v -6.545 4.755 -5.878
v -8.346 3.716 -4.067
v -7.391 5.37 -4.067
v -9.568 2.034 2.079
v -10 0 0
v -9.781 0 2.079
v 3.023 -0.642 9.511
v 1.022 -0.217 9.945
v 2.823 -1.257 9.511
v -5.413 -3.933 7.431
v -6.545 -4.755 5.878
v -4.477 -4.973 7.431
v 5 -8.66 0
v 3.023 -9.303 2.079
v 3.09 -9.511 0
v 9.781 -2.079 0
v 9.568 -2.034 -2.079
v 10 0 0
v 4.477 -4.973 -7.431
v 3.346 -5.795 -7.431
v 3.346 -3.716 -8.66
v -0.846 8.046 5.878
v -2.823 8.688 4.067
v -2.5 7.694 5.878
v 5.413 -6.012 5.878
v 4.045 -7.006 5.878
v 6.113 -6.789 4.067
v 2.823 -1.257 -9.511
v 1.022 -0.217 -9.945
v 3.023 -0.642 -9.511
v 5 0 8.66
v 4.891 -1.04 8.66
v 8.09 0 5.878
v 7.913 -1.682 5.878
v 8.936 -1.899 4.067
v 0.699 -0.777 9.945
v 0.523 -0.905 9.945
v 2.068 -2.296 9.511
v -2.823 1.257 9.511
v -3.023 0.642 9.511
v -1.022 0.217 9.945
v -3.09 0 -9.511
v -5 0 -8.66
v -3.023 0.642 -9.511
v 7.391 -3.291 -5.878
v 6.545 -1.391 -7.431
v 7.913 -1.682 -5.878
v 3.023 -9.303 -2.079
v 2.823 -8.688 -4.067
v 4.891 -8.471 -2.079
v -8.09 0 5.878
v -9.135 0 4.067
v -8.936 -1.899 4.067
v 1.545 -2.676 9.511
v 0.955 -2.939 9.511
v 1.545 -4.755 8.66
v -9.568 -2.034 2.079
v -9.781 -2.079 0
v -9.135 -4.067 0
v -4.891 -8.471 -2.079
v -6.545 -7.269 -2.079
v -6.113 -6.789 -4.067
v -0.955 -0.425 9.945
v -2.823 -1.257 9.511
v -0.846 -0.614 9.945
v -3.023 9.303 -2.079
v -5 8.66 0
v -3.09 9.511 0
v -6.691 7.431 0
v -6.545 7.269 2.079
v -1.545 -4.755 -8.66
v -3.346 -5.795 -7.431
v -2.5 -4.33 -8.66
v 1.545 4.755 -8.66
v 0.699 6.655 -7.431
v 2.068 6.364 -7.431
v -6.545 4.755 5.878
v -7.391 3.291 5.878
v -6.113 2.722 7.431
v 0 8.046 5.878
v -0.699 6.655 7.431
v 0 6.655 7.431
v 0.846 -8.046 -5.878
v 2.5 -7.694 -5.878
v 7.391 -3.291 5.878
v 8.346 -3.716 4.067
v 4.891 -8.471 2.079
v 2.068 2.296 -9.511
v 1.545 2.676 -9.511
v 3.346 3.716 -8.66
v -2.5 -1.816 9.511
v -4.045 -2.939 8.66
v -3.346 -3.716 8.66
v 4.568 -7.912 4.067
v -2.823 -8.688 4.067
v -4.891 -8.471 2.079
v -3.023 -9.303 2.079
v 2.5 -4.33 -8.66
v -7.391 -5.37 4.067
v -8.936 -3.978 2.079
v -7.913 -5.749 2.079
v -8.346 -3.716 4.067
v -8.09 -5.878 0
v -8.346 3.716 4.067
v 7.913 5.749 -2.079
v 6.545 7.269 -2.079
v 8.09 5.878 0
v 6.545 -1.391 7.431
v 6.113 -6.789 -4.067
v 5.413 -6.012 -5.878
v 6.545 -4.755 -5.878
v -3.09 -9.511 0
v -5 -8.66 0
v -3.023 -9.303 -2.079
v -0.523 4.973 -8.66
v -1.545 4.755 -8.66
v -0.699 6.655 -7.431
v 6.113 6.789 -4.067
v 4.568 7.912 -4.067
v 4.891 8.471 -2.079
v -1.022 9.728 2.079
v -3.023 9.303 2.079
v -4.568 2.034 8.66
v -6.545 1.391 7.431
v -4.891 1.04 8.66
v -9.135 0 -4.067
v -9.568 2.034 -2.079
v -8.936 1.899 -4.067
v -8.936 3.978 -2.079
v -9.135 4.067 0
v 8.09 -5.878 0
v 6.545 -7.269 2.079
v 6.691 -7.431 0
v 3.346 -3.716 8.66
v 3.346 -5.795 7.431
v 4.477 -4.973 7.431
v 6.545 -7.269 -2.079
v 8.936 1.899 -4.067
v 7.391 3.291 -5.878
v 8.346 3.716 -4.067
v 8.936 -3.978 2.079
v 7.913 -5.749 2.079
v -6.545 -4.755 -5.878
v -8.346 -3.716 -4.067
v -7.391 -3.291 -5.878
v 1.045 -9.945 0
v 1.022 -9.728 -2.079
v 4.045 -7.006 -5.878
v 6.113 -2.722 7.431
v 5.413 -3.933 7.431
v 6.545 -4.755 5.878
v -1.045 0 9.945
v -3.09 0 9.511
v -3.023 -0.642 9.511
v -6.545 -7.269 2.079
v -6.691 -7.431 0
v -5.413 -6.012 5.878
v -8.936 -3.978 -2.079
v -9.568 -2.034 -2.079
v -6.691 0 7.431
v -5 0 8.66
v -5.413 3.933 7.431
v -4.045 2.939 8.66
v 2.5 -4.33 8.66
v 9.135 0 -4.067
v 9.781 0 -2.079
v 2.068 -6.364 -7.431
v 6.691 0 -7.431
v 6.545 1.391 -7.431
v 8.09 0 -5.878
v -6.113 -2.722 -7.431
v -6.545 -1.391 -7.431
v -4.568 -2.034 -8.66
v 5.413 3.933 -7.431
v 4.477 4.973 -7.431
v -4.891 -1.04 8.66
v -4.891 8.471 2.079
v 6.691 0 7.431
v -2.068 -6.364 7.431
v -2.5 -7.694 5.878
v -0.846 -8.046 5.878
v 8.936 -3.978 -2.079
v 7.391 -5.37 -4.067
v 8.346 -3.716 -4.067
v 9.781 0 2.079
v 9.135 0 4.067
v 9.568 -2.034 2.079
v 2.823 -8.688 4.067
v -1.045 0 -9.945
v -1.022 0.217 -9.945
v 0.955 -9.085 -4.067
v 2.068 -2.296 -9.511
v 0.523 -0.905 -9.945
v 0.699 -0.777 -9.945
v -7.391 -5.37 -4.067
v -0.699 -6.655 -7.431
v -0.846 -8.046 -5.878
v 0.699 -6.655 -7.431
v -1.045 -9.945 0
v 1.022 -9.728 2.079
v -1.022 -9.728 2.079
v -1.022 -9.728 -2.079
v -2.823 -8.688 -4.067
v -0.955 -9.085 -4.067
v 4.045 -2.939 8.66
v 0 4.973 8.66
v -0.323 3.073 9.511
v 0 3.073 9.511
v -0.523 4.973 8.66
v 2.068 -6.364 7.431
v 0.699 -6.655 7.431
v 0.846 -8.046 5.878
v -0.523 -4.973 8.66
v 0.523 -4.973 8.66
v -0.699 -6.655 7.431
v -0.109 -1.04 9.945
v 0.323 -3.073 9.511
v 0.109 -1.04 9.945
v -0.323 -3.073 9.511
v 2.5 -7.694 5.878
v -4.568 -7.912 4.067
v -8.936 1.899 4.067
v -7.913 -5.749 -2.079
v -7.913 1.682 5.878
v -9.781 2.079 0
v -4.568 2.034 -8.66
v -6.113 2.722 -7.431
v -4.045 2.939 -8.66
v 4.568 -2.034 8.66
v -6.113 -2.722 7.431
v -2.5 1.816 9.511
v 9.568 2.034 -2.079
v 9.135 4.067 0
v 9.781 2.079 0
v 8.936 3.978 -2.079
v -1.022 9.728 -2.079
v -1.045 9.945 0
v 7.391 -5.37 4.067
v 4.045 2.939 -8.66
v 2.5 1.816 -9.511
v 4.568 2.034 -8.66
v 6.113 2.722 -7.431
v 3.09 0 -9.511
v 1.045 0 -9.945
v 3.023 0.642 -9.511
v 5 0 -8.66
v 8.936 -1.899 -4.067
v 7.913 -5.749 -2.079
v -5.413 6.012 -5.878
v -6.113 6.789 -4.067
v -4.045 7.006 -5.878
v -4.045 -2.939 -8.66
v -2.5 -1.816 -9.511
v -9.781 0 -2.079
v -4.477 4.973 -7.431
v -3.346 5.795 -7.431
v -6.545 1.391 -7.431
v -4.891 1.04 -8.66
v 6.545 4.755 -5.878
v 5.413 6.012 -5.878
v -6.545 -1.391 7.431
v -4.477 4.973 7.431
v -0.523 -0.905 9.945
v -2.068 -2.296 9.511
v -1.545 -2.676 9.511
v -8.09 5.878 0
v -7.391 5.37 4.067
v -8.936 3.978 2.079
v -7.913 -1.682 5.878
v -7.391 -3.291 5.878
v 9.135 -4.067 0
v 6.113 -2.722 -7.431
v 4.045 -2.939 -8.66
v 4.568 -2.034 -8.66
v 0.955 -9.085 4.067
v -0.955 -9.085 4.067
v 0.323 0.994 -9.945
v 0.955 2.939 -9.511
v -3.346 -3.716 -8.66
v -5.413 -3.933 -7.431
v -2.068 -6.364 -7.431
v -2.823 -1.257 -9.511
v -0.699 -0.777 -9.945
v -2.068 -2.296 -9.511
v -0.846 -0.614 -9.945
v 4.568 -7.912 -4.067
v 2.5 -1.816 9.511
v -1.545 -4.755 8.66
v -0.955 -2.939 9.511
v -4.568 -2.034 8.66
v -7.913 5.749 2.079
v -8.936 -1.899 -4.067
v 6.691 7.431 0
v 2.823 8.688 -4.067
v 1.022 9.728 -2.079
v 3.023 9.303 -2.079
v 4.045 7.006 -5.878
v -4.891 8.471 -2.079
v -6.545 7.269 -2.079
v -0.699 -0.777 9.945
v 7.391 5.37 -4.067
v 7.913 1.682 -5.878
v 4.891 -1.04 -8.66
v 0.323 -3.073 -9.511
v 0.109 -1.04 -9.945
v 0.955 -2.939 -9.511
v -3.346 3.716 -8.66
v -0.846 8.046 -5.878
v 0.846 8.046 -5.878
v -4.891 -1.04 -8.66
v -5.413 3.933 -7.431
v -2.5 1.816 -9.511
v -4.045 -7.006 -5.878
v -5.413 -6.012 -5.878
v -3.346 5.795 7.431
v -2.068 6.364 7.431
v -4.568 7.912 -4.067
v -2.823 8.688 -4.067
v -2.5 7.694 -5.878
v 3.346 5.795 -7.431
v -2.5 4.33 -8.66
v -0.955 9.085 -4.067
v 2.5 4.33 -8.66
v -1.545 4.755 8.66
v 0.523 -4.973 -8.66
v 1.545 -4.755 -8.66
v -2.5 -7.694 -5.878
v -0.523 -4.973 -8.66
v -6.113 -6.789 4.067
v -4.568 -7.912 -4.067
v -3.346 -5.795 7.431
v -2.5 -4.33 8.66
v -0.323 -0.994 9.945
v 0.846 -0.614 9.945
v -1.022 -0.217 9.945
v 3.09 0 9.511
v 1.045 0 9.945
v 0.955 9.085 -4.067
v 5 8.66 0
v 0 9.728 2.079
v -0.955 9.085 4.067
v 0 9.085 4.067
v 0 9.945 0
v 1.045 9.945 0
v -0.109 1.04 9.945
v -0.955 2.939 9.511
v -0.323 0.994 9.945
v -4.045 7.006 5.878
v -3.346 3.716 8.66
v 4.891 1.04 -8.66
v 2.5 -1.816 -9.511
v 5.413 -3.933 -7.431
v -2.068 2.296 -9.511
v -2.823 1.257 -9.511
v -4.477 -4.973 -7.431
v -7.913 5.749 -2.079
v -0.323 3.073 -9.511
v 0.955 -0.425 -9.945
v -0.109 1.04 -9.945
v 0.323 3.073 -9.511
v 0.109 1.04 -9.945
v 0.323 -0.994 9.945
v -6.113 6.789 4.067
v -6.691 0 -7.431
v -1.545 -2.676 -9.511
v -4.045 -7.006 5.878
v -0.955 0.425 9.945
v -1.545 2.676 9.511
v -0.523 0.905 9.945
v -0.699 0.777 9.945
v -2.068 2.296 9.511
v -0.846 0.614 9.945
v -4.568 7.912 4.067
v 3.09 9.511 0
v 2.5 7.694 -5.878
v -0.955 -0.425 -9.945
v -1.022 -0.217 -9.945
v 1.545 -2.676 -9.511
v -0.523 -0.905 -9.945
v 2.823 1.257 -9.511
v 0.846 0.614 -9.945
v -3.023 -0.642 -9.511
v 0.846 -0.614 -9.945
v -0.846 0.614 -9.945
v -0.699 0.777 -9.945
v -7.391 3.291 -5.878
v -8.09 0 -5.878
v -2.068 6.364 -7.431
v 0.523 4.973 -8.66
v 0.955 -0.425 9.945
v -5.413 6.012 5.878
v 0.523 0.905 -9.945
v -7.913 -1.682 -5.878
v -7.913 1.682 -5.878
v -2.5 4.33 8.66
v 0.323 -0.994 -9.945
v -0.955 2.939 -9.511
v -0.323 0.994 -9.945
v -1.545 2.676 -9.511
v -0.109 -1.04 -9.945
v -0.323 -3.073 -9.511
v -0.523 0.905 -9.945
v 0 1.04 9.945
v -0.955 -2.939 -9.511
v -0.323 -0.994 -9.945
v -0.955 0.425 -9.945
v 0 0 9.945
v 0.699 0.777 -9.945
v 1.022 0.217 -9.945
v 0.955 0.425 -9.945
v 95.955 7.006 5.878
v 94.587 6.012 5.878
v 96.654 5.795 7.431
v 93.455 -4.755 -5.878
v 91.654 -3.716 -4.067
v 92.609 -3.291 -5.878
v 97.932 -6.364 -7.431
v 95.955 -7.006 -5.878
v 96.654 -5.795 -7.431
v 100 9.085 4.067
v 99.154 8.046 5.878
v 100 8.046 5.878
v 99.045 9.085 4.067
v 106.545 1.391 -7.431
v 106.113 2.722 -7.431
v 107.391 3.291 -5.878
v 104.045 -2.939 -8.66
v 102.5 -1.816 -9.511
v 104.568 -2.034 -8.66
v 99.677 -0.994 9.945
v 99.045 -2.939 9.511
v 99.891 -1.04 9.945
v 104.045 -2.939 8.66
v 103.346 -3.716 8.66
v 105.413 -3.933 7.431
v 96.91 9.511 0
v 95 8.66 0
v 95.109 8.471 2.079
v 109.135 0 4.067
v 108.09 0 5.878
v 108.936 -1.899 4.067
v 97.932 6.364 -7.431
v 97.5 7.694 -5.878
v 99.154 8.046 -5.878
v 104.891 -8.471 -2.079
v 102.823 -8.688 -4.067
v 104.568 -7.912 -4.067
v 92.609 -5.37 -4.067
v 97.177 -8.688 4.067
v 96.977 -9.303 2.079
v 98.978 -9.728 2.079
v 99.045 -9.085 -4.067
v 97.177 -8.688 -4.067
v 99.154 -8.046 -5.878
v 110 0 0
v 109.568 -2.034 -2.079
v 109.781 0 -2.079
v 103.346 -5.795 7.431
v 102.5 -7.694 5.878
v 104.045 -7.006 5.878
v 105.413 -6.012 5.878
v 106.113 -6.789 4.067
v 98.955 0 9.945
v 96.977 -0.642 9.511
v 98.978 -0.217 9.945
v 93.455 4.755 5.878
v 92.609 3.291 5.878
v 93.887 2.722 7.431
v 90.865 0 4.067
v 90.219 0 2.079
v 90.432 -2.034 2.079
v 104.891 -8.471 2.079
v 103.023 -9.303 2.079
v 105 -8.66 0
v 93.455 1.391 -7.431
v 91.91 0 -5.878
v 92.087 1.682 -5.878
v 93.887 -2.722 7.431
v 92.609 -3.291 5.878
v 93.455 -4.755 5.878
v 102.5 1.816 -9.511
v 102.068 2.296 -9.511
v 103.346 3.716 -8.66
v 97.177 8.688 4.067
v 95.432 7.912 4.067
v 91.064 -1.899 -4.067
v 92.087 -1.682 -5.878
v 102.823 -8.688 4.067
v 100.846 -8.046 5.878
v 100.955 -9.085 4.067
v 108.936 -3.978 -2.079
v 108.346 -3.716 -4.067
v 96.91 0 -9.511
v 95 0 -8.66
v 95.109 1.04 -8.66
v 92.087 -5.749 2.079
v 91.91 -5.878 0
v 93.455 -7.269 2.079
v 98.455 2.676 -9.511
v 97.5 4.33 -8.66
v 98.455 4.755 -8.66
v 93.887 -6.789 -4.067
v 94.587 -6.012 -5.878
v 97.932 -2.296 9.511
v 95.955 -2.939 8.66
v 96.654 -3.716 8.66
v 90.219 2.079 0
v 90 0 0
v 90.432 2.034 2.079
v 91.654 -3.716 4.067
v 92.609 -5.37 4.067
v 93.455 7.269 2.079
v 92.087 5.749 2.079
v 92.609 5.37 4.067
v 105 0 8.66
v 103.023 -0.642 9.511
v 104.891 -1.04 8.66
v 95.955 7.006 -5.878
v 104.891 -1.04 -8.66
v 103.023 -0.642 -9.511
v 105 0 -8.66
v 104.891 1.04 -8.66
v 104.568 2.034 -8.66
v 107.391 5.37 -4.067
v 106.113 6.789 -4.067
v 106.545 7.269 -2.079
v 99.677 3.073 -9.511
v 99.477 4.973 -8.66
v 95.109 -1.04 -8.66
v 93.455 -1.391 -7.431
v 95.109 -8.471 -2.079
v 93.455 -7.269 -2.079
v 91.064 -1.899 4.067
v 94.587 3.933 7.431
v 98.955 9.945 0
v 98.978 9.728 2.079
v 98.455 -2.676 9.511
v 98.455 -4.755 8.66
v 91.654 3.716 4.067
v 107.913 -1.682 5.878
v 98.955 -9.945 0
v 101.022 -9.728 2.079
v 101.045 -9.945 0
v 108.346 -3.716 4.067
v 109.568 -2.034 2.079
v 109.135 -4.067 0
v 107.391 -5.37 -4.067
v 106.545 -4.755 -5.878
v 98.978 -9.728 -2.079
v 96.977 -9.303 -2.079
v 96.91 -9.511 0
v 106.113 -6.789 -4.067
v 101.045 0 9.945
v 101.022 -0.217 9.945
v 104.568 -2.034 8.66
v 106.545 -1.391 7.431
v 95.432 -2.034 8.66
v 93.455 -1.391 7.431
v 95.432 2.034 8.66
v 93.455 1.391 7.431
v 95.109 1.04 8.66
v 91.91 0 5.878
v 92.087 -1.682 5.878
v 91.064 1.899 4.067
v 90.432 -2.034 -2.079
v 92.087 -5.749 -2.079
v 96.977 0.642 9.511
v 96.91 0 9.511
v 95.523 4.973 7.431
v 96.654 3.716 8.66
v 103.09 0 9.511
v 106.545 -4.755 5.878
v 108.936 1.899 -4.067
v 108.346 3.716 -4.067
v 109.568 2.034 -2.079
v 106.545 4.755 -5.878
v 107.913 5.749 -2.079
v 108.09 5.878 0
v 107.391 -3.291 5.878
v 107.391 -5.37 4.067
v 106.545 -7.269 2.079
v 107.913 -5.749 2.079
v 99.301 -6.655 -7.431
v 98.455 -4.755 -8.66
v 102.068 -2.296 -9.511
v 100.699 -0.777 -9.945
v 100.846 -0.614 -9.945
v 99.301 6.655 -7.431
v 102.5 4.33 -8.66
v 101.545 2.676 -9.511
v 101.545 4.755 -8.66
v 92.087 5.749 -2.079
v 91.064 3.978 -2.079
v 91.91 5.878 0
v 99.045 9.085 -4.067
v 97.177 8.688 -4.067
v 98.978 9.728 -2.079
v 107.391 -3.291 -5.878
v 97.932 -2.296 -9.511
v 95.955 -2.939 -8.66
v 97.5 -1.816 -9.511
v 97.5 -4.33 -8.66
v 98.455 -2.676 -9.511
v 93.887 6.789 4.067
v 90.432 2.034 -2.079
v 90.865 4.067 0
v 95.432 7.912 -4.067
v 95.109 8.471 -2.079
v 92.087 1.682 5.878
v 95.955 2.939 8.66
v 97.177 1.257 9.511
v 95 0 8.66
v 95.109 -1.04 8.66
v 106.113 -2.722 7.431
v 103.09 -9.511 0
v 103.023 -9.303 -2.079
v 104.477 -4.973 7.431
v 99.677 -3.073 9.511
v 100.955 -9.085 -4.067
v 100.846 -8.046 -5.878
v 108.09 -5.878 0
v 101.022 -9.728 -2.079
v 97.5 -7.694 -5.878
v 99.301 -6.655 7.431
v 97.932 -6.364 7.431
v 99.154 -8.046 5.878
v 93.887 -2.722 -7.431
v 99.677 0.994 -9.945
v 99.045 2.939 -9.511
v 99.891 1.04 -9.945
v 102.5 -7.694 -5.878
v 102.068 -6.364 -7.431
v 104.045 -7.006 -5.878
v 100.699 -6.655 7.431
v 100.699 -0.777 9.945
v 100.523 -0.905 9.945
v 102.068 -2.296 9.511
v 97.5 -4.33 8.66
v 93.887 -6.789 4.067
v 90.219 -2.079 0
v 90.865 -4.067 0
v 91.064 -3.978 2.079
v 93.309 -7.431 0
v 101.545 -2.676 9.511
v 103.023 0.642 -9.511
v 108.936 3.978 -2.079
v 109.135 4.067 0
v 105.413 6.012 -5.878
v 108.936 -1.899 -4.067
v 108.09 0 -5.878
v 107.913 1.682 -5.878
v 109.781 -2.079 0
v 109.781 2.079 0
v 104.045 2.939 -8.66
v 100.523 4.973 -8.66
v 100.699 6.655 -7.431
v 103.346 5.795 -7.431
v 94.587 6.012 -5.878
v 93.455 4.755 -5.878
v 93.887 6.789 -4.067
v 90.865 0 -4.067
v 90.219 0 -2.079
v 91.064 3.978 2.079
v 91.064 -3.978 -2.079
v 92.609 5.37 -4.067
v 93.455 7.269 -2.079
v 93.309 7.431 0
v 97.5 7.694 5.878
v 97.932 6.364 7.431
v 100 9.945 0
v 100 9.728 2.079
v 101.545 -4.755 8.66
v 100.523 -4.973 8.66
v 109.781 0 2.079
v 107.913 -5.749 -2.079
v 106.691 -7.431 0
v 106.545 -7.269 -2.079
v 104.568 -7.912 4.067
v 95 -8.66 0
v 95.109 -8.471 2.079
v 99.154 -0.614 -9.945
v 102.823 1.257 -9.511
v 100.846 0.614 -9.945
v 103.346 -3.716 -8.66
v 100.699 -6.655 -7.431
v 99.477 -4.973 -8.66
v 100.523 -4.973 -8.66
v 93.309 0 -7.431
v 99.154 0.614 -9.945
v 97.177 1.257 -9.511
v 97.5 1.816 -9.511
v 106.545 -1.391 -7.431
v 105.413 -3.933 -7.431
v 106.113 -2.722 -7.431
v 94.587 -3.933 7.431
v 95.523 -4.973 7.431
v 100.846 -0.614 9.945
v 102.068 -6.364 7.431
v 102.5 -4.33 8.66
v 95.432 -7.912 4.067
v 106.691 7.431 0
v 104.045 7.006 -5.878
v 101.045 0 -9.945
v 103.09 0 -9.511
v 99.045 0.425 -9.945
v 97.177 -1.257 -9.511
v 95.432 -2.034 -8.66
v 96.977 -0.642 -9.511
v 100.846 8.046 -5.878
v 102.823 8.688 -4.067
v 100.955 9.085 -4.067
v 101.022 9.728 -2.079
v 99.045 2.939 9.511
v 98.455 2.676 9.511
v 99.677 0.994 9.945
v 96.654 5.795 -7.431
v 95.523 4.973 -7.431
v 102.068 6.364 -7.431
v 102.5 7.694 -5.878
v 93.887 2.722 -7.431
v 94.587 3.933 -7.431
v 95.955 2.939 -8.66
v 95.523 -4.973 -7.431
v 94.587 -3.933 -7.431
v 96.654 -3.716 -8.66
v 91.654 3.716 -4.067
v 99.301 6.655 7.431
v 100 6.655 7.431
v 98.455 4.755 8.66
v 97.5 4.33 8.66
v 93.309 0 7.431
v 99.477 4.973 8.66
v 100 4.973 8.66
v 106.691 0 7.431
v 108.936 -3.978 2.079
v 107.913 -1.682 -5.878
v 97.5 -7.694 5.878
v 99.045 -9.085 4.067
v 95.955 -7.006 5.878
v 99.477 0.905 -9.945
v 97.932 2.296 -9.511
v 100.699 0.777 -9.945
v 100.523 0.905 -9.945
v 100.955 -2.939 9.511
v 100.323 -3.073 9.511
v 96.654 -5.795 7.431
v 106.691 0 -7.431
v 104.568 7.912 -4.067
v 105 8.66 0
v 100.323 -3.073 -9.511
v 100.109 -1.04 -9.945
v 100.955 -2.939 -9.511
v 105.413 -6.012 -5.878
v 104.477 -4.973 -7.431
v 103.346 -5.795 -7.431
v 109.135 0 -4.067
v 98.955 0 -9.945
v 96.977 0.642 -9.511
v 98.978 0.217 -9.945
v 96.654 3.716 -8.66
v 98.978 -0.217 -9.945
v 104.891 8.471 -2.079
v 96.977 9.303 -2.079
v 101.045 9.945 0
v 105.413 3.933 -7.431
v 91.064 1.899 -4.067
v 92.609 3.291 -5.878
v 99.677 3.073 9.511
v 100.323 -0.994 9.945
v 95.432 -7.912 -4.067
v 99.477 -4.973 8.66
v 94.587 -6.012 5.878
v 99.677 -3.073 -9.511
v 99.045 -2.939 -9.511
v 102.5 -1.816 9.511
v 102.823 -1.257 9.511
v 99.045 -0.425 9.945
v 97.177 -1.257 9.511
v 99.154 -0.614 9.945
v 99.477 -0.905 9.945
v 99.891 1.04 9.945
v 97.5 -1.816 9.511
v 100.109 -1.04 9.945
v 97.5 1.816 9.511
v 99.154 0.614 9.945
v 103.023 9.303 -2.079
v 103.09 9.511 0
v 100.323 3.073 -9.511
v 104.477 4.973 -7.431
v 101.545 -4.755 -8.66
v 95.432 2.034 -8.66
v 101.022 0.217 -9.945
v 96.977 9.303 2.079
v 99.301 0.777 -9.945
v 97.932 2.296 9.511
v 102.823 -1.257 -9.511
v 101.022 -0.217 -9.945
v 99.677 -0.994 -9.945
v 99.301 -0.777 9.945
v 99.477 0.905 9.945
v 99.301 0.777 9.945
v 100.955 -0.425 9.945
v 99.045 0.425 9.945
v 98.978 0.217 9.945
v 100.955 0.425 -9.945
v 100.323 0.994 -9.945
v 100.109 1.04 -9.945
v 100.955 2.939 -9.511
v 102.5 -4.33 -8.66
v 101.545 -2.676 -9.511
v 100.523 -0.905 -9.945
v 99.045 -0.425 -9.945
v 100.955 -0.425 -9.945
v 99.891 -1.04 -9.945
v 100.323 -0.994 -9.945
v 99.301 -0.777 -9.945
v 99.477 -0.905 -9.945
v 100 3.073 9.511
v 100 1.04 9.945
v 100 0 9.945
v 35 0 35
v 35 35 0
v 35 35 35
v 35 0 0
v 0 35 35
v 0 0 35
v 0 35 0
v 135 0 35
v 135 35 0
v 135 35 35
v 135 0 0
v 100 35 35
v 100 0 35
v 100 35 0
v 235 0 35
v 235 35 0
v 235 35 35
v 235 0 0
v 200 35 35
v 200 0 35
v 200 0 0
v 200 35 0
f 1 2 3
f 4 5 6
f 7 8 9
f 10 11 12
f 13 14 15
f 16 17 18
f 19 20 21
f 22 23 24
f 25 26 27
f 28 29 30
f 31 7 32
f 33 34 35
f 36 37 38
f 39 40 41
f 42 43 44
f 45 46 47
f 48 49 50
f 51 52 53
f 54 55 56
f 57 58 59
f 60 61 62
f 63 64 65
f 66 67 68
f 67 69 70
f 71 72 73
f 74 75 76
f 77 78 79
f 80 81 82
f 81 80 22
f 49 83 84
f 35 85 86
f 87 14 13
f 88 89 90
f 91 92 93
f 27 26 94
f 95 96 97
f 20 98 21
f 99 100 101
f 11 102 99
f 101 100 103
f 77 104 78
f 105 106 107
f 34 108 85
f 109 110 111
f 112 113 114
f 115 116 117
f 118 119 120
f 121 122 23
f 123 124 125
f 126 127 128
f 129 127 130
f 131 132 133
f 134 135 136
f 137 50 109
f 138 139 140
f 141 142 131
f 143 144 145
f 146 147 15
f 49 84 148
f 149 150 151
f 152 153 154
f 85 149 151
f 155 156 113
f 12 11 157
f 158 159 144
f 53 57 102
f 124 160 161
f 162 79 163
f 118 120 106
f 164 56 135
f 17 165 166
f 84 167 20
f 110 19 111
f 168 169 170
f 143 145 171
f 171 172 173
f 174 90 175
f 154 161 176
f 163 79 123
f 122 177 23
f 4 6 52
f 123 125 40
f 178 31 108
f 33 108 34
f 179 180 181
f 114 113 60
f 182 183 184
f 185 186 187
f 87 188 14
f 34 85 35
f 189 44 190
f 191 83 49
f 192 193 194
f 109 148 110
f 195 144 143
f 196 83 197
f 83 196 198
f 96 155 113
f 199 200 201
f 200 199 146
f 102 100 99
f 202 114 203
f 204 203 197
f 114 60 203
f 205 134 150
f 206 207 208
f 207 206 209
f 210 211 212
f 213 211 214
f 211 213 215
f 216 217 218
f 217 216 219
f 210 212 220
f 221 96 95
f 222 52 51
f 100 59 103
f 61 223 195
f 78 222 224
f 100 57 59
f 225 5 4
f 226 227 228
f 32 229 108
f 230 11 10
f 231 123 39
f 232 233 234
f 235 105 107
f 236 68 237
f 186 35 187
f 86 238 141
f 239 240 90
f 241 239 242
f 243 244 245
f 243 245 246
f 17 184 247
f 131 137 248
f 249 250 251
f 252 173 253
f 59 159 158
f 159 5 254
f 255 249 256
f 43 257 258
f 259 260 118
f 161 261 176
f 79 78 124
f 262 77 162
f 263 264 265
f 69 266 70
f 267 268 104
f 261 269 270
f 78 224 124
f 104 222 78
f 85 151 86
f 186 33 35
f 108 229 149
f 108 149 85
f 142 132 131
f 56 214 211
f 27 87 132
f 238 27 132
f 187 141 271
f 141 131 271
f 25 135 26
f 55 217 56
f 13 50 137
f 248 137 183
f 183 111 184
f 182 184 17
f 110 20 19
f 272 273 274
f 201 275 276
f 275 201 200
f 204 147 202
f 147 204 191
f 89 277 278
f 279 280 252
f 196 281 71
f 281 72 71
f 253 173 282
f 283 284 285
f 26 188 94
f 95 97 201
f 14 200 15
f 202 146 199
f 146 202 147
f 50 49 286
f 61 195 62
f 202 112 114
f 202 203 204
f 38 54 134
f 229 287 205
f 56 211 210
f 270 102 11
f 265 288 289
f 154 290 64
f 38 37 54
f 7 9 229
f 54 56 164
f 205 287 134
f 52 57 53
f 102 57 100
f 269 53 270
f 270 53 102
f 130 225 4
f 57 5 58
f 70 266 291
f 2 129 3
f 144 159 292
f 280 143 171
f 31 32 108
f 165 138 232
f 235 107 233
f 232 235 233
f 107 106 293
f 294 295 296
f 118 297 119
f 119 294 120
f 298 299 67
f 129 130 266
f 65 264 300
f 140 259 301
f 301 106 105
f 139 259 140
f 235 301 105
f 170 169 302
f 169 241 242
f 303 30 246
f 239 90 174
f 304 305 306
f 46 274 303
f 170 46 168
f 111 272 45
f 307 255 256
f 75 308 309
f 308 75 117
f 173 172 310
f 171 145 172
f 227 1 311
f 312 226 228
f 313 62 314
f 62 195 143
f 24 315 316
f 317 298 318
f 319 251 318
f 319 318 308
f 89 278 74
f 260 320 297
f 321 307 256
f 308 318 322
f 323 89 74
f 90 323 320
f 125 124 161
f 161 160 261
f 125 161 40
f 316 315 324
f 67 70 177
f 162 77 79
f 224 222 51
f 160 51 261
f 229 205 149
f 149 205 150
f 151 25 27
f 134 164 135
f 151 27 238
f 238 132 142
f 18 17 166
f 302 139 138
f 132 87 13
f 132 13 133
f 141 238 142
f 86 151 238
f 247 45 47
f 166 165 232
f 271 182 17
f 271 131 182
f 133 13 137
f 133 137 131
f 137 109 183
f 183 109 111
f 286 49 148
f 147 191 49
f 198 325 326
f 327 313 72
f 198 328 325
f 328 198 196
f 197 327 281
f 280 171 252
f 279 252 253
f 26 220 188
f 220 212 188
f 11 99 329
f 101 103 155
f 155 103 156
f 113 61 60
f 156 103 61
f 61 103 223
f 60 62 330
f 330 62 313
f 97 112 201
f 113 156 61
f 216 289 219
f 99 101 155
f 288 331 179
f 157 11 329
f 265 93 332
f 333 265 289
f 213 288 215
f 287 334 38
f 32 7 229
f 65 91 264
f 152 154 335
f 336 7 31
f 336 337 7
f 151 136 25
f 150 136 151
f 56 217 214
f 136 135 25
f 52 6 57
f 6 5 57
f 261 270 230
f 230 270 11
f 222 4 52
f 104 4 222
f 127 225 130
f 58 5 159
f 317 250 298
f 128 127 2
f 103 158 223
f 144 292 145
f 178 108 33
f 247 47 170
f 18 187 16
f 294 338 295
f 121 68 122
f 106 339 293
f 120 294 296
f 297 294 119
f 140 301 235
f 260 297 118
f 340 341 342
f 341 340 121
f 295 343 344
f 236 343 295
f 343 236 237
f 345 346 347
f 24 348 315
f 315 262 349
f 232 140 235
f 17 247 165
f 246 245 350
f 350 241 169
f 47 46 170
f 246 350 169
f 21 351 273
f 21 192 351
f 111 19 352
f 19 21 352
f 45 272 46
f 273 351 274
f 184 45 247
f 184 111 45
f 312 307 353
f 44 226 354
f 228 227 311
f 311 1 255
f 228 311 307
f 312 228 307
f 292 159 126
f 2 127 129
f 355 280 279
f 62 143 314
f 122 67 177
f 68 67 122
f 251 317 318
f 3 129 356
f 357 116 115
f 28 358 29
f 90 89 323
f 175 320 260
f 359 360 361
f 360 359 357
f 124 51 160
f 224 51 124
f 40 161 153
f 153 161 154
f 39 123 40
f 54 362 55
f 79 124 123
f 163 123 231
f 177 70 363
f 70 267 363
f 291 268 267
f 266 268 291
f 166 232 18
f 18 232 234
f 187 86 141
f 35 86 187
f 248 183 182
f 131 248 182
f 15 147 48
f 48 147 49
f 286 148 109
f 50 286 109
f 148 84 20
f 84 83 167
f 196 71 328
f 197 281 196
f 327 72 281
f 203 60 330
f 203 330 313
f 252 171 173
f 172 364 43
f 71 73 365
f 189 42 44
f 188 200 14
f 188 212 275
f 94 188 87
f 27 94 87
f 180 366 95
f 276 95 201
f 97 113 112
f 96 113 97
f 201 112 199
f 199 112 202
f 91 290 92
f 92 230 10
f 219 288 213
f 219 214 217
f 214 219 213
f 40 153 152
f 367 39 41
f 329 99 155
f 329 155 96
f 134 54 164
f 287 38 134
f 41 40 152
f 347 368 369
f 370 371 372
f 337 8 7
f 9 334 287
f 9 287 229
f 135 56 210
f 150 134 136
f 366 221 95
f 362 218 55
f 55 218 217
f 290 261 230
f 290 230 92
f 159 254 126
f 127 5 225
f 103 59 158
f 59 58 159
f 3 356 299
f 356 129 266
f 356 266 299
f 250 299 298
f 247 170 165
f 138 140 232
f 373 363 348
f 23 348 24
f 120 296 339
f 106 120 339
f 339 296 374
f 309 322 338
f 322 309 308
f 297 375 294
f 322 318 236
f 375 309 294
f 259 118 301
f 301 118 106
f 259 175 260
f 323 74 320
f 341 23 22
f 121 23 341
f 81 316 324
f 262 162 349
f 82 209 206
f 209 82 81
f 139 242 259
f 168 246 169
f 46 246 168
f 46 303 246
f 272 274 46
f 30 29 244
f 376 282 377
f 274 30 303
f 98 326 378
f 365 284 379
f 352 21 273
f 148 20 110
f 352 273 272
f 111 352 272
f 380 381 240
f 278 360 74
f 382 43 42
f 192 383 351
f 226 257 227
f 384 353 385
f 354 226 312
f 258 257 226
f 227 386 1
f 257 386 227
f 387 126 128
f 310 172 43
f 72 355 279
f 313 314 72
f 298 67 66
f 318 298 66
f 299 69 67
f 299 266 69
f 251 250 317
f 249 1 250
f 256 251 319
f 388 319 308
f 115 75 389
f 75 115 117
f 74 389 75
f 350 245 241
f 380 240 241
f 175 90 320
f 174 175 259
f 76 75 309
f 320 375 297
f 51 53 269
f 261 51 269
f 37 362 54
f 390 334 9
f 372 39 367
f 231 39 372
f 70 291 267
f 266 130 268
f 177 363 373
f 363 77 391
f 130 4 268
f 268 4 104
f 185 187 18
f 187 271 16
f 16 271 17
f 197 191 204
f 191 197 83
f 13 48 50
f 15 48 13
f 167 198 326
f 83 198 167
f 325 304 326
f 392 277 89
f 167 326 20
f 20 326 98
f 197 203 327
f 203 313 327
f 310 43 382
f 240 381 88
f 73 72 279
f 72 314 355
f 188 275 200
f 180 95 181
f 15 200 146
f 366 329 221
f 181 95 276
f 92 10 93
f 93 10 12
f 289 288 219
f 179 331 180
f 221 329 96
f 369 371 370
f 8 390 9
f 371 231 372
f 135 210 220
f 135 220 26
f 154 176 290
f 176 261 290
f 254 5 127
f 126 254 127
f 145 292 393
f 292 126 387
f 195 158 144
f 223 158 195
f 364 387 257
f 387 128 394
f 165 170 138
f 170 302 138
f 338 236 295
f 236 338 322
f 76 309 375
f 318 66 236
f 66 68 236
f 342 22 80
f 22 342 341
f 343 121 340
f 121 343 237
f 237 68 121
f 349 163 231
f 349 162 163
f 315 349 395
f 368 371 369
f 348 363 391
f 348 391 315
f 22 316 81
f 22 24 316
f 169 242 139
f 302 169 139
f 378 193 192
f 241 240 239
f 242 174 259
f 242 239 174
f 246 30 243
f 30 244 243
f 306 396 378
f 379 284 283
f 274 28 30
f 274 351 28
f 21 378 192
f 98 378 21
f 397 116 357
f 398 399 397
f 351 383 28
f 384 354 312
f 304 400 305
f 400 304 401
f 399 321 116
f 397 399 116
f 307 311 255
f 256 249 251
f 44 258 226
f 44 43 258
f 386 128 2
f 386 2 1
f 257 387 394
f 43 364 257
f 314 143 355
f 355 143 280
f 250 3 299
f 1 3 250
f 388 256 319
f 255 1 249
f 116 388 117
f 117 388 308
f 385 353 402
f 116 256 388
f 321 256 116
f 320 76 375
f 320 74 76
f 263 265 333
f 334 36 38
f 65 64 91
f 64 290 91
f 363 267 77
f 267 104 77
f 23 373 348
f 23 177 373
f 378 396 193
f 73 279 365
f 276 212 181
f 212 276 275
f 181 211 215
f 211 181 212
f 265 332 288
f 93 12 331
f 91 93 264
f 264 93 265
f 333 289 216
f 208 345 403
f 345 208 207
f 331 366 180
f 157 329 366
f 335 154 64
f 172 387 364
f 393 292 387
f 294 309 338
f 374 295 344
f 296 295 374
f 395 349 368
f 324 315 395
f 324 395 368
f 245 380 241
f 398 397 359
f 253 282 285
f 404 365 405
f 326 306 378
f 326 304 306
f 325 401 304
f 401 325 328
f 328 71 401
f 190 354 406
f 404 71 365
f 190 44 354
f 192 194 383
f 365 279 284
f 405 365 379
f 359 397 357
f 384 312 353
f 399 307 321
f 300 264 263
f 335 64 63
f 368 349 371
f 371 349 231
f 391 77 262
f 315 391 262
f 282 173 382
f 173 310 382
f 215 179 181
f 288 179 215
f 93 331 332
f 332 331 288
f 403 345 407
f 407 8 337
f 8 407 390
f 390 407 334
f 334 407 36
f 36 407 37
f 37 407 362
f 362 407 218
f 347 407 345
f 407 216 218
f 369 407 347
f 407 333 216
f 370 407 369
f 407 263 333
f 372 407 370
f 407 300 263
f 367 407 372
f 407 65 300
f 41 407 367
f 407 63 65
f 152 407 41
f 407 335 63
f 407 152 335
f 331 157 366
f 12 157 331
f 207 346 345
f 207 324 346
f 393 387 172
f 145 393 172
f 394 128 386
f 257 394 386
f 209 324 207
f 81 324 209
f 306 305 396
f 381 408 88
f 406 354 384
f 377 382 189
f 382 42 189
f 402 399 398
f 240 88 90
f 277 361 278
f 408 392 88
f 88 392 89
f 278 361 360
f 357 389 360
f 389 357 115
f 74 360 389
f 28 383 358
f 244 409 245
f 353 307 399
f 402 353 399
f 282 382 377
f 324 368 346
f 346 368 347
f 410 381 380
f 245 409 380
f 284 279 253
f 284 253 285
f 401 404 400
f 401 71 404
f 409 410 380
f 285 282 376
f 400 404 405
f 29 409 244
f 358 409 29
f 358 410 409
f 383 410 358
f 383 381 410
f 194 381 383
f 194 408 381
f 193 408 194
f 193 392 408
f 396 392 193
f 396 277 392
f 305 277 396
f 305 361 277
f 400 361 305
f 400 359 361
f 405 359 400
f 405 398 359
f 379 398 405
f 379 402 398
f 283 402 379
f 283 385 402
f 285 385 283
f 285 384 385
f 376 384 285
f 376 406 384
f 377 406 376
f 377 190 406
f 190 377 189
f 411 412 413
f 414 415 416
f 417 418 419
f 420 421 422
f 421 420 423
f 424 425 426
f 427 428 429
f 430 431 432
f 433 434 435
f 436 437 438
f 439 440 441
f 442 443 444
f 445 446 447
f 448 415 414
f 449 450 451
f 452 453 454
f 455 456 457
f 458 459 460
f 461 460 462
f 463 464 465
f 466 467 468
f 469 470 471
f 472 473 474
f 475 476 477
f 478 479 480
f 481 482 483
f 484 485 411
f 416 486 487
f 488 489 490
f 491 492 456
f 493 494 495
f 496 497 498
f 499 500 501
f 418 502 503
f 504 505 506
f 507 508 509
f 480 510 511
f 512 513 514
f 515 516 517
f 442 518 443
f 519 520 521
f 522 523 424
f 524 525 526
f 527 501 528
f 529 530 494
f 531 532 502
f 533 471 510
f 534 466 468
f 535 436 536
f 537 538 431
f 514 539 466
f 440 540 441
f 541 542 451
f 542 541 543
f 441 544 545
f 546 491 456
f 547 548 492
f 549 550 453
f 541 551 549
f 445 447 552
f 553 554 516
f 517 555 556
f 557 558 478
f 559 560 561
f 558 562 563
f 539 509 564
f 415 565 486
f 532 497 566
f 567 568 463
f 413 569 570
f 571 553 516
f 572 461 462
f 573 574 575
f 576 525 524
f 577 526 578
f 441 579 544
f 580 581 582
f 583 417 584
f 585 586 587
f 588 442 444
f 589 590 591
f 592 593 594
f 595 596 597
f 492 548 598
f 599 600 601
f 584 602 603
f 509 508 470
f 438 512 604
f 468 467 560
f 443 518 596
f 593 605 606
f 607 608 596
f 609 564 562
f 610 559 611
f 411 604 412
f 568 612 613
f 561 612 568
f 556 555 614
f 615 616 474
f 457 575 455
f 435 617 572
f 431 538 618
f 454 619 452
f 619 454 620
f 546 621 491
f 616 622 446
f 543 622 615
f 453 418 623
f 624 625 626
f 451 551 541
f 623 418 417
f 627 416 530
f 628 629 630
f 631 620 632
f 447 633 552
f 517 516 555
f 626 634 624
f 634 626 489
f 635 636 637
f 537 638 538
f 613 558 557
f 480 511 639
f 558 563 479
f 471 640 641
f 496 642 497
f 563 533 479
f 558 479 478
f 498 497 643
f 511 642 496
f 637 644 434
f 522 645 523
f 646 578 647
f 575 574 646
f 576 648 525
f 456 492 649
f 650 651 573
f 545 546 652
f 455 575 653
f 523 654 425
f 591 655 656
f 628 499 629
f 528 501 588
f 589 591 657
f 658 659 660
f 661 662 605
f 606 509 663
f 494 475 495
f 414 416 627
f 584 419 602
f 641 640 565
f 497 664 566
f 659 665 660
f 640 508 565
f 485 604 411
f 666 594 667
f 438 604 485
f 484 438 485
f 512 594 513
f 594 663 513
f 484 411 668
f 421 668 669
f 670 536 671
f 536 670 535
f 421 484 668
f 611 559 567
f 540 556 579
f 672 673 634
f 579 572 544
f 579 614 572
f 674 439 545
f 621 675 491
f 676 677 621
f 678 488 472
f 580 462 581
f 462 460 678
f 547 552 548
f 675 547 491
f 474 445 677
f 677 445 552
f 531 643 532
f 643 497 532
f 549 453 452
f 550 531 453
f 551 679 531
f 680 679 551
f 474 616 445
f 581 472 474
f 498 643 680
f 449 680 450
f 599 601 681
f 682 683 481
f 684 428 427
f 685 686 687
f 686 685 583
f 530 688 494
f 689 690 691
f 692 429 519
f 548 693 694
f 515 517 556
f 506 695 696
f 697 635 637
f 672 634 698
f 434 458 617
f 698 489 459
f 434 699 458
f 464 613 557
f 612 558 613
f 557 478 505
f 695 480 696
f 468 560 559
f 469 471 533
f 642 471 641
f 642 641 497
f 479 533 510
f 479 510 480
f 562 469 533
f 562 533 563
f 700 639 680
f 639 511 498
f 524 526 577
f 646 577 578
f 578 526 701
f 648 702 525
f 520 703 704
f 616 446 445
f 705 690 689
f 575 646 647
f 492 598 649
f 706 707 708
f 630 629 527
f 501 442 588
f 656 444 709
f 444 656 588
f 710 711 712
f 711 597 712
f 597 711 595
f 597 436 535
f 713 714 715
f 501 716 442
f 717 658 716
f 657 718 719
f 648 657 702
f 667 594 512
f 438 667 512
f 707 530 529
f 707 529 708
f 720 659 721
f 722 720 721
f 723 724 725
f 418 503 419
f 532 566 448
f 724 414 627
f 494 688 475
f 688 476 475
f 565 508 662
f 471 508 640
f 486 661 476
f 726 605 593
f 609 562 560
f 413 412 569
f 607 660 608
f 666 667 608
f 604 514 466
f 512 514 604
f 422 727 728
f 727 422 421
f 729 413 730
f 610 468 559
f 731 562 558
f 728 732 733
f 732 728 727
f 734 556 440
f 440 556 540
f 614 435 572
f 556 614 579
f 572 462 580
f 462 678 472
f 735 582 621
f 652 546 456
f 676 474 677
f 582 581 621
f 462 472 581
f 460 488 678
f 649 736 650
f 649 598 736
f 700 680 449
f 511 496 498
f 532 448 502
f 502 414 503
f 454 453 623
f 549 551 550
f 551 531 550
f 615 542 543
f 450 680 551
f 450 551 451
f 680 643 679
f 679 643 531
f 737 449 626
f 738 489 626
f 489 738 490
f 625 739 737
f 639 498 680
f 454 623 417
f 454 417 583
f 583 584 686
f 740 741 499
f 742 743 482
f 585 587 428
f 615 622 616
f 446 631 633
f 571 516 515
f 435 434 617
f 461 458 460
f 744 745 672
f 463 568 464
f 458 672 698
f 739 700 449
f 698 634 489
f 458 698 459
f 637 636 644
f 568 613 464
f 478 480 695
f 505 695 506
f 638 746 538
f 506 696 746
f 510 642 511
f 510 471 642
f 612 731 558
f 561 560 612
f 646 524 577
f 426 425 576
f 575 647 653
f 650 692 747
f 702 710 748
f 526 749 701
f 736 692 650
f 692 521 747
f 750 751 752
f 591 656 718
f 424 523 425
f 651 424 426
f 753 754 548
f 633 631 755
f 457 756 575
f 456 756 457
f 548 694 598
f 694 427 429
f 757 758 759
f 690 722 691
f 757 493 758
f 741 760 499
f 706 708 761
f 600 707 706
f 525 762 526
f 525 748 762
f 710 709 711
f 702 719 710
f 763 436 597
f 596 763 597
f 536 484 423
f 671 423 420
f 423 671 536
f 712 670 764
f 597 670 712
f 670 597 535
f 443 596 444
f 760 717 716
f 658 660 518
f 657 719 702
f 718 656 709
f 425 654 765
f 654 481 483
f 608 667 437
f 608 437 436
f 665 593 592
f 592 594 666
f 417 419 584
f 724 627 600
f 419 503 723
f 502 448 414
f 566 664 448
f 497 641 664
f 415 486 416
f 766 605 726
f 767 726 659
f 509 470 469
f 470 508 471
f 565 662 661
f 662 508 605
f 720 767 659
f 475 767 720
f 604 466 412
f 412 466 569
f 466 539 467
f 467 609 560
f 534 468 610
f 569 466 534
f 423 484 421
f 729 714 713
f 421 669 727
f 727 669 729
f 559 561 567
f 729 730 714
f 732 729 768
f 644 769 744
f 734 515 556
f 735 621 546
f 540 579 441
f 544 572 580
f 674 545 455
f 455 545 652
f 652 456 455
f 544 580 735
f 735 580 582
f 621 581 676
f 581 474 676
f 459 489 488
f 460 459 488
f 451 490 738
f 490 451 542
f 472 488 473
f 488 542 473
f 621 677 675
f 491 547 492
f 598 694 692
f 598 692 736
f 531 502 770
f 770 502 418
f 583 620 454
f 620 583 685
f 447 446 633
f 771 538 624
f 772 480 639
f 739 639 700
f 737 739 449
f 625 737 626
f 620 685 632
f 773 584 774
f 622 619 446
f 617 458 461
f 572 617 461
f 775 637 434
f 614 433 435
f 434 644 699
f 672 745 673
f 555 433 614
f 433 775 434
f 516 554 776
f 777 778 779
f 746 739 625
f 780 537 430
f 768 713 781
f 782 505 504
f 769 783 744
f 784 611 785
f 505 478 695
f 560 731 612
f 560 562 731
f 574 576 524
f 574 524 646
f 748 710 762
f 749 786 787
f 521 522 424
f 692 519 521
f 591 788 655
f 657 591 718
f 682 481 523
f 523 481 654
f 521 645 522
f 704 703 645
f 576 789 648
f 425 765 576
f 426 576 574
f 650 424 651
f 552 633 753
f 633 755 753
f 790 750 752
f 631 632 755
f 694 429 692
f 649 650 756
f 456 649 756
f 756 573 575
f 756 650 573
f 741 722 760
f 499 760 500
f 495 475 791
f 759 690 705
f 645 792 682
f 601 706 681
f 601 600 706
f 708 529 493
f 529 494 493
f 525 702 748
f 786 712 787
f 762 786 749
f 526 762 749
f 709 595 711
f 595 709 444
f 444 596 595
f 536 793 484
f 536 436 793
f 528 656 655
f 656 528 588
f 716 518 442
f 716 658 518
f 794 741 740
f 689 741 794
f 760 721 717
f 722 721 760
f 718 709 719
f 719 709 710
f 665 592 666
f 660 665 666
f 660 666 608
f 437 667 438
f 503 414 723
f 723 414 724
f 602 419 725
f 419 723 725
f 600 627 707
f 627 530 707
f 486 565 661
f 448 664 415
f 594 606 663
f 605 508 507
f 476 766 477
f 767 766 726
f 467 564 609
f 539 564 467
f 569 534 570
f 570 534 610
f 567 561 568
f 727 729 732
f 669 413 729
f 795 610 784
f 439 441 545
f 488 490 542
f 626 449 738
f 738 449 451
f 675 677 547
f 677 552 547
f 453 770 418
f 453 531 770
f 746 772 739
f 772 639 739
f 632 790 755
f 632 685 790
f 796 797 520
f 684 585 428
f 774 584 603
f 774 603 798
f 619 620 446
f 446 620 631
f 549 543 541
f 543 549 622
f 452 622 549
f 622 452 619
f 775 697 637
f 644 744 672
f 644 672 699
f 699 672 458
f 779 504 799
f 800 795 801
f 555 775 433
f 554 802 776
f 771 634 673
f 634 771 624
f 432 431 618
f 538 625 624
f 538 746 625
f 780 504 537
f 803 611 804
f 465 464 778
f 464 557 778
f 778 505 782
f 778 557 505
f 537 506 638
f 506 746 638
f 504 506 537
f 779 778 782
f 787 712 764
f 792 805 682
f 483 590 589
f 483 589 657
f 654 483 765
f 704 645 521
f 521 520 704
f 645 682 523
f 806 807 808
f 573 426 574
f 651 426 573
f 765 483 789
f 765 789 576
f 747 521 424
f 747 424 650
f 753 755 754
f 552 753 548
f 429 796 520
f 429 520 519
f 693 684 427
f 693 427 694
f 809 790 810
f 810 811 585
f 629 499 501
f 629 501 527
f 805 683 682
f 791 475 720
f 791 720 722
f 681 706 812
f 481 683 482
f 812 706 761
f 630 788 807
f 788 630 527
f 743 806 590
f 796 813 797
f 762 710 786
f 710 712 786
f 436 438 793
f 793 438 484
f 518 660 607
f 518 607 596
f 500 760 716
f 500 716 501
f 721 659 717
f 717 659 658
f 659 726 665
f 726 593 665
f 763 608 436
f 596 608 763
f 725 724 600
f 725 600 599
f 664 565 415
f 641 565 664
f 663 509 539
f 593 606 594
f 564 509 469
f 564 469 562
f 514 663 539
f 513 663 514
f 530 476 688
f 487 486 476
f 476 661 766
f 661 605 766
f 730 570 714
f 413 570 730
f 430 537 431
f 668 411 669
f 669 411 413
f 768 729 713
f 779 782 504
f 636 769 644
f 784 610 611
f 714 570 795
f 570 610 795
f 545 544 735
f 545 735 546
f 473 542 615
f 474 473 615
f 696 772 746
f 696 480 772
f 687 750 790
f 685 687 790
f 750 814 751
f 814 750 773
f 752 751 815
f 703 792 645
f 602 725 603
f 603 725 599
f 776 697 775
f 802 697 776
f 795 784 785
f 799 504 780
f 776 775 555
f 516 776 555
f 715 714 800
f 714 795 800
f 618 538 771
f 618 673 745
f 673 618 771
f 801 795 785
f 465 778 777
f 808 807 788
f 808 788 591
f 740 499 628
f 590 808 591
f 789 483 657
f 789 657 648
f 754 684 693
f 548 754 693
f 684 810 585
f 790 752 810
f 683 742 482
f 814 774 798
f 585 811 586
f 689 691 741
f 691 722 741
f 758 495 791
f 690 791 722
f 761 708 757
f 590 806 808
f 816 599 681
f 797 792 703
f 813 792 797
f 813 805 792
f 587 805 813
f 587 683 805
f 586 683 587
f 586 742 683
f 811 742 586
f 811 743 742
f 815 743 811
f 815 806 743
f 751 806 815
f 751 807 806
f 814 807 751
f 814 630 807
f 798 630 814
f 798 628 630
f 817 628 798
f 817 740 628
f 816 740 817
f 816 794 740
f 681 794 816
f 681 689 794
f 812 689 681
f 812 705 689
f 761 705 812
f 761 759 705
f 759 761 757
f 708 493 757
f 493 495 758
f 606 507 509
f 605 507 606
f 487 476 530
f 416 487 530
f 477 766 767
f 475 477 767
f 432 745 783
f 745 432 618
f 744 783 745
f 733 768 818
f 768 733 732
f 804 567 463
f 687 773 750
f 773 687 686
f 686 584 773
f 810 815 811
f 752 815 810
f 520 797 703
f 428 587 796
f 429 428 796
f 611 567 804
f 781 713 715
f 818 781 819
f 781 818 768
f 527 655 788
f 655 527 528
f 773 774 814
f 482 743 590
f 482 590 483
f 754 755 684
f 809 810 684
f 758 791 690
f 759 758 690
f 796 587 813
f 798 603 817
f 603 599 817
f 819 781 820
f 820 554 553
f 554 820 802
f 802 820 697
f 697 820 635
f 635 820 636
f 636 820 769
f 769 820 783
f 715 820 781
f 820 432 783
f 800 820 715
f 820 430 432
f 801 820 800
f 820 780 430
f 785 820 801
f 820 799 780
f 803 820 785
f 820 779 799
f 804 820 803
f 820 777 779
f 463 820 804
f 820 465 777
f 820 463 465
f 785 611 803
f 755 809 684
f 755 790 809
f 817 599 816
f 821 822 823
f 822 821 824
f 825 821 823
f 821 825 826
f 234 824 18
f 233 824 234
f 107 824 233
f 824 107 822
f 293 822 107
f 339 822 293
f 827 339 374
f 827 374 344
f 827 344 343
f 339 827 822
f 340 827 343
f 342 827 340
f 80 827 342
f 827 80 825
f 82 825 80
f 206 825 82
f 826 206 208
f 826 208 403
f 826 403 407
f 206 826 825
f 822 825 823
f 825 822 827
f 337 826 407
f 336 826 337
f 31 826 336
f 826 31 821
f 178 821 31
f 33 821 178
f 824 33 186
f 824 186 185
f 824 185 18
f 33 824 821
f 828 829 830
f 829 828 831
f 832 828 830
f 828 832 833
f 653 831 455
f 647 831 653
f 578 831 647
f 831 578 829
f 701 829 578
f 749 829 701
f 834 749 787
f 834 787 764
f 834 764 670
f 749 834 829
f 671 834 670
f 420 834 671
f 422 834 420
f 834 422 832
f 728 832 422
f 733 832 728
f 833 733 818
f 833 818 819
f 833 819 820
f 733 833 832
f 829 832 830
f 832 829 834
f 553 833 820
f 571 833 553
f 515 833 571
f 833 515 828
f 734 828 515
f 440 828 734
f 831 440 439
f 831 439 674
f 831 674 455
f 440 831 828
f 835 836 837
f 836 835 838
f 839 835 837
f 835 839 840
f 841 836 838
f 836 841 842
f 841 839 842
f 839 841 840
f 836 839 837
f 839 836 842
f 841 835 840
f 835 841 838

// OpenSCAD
module lineup(space) {
    for(i = [0 : $children - 1]) { // $children表示數量
        translate([space * i, 0, 0]) 
            children(i);
    }
}

lineup(100) { 
    sphere(10); 
    sphere(10); 
}

lineup(100) { 
    cube(35); 
    cube(35); 
    cube(35); 
}
